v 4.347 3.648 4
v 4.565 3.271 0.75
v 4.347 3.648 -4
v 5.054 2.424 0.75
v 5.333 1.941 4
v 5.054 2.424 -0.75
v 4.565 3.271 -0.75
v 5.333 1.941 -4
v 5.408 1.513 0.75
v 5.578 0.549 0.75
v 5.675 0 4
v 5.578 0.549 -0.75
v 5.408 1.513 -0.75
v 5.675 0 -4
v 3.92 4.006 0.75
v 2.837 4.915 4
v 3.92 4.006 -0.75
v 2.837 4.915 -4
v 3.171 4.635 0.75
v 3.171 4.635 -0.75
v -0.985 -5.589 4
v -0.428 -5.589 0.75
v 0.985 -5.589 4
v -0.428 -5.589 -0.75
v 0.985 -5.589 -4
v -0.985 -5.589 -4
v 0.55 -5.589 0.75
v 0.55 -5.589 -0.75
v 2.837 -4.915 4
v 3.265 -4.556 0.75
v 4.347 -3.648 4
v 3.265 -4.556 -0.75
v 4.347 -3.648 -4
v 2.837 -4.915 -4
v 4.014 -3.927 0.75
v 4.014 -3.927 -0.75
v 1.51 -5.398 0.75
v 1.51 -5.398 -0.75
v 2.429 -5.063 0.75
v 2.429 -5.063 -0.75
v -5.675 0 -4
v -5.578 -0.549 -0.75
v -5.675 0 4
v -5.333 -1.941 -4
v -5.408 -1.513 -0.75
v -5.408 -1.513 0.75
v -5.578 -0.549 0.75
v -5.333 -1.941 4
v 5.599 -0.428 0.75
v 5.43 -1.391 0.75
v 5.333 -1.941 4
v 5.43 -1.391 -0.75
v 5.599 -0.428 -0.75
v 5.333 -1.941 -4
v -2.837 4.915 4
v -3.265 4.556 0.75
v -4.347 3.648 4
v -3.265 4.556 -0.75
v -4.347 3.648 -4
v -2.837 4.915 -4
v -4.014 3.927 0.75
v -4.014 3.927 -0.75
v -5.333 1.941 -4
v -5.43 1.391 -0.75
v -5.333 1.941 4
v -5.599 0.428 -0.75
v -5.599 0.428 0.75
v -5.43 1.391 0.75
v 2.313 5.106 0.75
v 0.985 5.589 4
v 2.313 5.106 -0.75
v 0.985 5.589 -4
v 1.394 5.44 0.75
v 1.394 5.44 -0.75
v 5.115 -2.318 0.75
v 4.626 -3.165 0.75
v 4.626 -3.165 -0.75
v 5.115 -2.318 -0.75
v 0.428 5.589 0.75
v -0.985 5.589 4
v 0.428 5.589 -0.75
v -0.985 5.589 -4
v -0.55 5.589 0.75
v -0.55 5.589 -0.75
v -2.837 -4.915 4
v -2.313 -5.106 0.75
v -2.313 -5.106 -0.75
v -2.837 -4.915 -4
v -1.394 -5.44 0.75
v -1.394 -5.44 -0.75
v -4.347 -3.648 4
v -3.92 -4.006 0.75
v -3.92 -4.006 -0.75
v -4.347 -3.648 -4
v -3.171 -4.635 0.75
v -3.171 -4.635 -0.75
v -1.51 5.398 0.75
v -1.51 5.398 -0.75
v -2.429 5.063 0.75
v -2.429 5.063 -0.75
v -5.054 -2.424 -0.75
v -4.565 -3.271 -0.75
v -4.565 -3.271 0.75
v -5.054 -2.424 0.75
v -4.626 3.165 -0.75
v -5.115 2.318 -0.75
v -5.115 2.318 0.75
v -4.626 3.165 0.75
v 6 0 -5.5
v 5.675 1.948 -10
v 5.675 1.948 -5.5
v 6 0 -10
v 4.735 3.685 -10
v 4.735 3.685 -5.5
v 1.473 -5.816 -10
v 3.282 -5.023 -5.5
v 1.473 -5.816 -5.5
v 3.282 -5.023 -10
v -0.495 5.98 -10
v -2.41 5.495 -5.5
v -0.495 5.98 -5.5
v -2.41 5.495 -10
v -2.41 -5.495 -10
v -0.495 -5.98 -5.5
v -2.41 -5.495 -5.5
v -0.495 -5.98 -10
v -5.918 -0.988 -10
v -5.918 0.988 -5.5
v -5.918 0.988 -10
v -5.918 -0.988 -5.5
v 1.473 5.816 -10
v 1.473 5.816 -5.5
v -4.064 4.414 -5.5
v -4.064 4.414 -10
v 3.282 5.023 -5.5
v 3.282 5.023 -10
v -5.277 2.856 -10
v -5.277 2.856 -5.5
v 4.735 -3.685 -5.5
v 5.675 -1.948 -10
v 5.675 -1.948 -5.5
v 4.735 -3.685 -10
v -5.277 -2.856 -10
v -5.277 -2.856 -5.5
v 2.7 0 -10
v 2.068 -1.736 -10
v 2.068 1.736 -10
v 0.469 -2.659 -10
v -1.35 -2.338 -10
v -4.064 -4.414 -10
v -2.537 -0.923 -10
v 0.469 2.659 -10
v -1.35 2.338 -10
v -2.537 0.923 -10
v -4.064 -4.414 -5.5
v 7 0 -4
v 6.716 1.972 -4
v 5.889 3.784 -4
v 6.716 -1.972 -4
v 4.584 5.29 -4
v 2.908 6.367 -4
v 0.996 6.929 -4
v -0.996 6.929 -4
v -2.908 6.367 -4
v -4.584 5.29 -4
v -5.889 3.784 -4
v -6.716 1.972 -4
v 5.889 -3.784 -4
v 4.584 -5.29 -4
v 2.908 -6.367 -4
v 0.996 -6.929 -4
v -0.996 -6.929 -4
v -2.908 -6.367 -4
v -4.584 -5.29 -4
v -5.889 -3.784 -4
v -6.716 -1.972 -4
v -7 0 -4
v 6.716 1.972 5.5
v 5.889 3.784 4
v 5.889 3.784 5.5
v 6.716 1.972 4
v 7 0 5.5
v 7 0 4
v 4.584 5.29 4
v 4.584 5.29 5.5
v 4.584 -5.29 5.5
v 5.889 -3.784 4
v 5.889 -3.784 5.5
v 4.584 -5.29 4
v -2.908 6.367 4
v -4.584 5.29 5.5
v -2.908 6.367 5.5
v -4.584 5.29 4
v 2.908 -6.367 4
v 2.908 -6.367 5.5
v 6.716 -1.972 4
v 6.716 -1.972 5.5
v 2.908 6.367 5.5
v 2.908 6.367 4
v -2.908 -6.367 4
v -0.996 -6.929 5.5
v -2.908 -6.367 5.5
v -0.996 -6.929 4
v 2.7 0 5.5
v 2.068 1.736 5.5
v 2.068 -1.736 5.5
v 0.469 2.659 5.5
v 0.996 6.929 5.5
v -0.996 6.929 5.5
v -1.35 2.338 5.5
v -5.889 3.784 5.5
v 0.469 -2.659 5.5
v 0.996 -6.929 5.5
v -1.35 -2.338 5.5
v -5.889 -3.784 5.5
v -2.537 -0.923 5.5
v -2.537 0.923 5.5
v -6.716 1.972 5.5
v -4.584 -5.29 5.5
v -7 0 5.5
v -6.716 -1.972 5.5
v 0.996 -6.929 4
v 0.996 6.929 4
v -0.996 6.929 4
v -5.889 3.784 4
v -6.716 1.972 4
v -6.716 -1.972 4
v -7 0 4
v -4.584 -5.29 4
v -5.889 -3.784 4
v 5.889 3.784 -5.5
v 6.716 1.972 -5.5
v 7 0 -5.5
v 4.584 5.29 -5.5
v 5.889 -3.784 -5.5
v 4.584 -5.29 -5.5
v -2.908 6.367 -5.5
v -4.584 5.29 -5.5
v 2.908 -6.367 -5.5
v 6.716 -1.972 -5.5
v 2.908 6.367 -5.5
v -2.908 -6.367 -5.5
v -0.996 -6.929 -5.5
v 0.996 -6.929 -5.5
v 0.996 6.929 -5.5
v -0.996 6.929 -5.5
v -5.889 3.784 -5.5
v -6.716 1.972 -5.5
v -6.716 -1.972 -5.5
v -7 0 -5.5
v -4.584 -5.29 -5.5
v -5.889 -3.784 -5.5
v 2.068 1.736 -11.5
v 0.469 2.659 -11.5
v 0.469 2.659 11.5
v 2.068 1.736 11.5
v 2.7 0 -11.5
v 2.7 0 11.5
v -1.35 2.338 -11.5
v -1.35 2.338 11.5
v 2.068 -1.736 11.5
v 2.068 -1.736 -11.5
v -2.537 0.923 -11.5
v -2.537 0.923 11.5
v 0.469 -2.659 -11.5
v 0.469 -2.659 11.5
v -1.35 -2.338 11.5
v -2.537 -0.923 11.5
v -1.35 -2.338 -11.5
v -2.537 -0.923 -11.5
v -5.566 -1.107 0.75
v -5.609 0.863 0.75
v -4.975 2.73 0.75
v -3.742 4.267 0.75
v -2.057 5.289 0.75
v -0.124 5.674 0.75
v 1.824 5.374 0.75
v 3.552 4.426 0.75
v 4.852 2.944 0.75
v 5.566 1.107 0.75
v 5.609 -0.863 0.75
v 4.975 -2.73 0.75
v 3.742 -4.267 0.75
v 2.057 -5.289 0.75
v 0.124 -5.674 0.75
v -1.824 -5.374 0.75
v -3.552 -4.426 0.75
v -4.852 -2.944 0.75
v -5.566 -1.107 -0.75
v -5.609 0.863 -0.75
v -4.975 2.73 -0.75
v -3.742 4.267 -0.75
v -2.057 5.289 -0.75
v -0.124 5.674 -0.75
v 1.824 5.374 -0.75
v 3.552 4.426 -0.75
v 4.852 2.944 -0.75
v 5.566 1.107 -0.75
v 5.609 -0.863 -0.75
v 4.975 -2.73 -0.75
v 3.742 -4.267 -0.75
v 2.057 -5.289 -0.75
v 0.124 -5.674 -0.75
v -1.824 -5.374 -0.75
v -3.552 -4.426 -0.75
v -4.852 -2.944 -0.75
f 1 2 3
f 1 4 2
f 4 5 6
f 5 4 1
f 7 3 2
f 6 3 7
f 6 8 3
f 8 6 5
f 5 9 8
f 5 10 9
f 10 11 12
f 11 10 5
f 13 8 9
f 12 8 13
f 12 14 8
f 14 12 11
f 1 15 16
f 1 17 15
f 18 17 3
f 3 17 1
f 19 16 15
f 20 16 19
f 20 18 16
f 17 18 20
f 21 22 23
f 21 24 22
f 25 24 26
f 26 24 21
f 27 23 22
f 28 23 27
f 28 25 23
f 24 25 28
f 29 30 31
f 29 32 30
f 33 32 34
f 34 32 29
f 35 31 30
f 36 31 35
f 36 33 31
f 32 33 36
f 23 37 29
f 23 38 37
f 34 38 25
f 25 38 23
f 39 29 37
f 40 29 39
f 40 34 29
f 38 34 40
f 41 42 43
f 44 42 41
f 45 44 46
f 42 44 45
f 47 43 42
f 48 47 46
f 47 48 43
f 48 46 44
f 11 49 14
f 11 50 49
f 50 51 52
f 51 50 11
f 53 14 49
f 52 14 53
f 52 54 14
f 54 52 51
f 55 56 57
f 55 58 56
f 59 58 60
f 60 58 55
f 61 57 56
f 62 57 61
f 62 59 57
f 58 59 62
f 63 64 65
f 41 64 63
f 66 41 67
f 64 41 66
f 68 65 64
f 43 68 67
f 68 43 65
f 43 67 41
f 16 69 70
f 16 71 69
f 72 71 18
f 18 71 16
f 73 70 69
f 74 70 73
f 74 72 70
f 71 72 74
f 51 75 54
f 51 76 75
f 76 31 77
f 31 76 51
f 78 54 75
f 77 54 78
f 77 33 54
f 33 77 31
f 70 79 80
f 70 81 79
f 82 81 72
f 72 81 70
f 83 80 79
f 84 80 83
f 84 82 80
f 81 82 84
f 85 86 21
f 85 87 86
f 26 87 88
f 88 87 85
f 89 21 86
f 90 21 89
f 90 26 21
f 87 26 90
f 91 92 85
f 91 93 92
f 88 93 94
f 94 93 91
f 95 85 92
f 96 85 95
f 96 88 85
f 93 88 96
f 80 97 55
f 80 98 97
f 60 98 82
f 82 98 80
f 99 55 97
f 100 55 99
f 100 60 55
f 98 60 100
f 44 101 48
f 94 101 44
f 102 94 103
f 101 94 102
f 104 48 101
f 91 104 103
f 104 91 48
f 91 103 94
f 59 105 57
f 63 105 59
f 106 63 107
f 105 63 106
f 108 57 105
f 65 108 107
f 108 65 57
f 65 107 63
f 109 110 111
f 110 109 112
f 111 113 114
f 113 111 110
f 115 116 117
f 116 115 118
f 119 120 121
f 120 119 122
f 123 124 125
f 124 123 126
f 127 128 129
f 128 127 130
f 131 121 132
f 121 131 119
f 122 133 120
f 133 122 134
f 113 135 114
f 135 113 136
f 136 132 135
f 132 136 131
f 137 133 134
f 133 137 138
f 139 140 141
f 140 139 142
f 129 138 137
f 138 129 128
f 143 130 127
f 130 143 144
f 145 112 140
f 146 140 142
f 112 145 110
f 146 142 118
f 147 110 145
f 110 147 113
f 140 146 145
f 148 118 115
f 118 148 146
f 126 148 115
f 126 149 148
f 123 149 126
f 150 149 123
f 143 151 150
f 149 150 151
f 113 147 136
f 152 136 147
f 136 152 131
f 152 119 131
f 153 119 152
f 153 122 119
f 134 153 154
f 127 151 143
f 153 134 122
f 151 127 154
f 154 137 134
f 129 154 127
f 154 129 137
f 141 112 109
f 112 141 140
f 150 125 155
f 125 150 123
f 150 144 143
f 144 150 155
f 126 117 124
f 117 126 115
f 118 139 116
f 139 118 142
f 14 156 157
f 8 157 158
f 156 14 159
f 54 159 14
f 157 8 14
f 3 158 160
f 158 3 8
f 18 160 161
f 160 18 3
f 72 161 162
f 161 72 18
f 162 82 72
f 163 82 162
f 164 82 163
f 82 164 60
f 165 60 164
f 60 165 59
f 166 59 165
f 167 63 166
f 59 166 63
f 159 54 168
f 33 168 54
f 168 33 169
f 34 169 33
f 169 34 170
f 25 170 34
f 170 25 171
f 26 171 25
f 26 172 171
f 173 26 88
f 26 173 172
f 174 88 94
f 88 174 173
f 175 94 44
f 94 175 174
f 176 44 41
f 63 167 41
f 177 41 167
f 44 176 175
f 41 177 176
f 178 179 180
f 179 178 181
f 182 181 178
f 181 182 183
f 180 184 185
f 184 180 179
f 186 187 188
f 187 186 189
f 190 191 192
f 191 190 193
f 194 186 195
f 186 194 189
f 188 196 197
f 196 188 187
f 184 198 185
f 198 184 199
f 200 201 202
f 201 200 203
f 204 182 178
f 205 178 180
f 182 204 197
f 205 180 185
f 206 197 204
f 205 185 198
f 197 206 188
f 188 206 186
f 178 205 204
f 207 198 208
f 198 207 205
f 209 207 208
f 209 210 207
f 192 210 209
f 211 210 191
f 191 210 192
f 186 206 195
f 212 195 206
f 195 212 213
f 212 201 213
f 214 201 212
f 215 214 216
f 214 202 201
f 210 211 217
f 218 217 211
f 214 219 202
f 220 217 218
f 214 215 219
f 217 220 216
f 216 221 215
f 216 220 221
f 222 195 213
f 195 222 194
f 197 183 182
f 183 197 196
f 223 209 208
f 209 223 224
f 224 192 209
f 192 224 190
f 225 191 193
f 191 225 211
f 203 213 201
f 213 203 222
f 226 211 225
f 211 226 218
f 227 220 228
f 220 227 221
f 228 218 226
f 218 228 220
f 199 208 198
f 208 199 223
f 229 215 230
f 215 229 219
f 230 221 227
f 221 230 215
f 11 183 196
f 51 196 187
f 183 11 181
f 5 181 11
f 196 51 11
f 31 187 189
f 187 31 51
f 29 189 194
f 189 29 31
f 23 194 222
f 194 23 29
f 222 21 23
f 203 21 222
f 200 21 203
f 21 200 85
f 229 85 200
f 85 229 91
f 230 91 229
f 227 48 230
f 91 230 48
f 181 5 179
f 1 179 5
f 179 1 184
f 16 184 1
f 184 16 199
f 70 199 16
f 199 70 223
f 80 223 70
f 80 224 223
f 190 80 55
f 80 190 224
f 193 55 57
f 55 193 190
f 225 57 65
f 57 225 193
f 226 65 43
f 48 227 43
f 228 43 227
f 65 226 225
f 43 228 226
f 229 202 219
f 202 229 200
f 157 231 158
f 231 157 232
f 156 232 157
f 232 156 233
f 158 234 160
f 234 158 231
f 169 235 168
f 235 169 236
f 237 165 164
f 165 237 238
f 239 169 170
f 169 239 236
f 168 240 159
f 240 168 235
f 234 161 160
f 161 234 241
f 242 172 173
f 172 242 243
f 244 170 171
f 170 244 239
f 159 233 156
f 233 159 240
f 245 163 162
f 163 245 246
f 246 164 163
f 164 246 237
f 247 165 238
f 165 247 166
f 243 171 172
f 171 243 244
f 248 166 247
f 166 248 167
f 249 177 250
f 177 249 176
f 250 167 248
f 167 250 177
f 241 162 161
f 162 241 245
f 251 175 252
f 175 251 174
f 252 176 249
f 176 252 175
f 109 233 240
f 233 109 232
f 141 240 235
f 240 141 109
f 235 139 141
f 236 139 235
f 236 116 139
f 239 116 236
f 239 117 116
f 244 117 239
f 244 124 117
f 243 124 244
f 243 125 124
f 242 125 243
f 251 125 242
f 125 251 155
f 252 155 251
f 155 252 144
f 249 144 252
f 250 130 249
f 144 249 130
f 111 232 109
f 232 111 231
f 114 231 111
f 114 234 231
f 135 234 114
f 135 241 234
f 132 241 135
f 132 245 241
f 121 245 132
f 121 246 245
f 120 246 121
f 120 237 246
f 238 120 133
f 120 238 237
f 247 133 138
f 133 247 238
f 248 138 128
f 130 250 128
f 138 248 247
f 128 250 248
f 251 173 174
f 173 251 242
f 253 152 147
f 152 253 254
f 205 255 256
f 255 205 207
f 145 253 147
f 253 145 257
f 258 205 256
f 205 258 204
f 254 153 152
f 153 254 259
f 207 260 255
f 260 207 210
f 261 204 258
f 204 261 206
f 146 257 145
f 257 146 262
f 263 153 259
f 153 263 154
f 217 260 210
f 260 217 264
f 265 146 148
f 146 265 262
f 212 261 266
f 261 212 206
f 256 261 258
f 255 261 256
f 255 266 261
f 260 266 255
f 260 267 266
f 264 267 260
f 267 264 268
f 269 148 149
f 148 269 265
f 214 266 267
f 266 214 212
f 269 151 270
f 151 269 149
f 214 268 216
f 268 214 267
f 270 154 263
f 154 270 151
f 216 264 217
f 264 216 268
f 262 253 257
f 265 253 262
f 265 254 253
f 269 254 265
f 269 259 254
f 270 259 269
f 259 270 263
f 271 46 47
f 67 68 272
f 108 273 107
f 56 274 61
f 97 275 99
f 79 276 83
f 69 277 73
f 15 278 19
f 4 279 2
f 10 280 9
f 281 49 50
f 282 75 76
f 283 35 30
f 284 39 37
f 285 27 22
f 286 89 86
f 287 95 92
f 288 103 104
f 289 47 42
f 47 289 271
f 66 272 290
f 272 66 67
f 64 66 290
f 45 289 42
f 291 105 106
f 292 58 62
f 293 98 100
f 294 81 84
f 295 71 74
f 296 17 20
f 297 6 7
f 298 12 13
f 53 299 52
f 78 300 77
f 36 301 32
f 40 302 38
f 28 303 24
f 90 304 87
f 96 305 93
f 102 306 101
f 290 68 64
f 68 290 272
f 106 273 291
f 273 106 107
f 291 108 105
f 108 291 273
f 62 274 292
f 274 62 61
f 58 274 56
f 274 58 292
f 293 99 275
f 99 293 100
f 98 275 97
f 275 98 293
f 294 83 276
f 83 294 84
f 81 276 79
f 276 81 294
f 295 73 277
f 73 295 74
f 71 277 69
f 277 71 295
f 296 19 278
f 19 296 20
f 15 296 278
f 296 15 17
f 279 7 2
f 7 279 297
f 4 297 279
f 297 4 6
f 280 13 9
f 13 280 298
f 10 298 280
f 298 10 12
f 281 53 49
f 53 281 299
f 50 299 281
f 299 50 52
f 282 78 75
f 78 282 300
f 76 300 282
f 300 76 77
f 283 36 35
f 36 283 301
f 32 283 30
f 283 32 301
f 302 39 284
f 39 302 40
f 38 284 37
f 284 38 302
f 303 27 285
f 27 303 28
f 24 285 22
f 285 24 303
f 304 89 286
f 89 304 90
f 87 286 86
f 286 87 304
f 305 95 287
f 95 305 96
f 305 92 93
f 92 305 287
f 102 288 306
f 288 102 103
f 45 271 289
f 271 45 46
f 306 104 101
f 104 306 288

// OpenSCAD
// Parameters
tooth_count = 16; //[8:64:1]
pitch_diameter_mm = 9.75; //[5:20:0.01]
pitch_radius_mm = 4.875; //[2.5:10:0.001]
belt_pitch_mm = 2; //[1:10:0.01]
tooth_depth_mm = 0.8; //[0.4:2:0.01]
tooth_width_mm = 1.5; //[0.8:4:0.01]
pulley_width_mm = 10; //[5:30:0.1]
bore_diameter_mm = 5; //[2:12:0.01]
hub_diameter_mm = 12; //[6:30:0.1]
hub_length_mm = 6; //[0:20:0.1]
flange_diameter_mm = 14; //[8:40:0.1]
flange_thickness_mm = 1.5; //[0:5:0.1]
set_screw_count = 1; //[0:4:1]
set_screw_hole_diameter_mm = 3; //[1.5:6:0.01]
set_screw_z_offset_mm = 3; //[0:20:0.1]
tolerance_mm = 0.2; //[0:0.6:0.01]
overlap_mm = 1; //[0.5:2:0.1]
pitch_ref_radial_thickness_mm = 0.4; //[0.2:1.5:0.05]
pitch_ref_z_thickness_mm = 0.6; //[0.2:2:0.05]

// Printed Pulley Teeth From Profile
module printed_pulley_teeth_from_profile() {
  rotate_extrude() {
    polygon(points=[
      [pitch_radius_mm - tooth_depth_mm, -tooth_width_mm/2],
      [pitch_radius_mm + tooth_depth_mm, -tooth_width_mm/2],
      [pitch_radius_mm + tooth_depth_mm, tooth_width_mm/2],
      [pitch_radius_mm - tooth_depth_mm, tooth_width_mm/2]
    ]);
  }
}

// Printed Pulley GT2 Teeth
module printed_pulley_GT2_teeth() {
  rotate([0, 0, 180/tooth_count])
    printed_pulley_teeth_from_profile();
}

// Printed Pulley Teeth
module printed_pulley_teeth() {
  printed_pulley_GT2_teeth();
}

// Pulley
module pulley() {
  color("Silver") {
    // Pulley body with hub and flanges
    union() {
      // Pulley body
      cylinder(r=pitch_radius_mm + tooth_depth_mm, h=pulley_width_mm, center=true);
      // Hub
      translate([0, 0, -(pulley_width_mm/2 + hub_length_mm/2 - overlap_mm)])
        cylinder(r=hub_diameter_mm/2, h=hub_length_mm, center=true);
      // Flanges
      translate([0, 0, pulley_width_mm/2 + flange_thickness_mm/2 - overlap_mm])
        cylinder(r=flange_diameter_mm/2, h=flange_thickness_mm, center=true);
      translate([0, 0, -(pulley_width_mm/2 + flange_thickness_mm/2 - overlap_mm)])
        cylinder(r=flange_diameter_mm/2, h=flange_thickness_mm, center=true);
    }
    // Pitch circle reference
    translate([0, 0, pulley_width_mm/2 - pitch_ref_z_thickness_mm/2 - overlap_mm])
      difference() {
        cylinder(r=pitch_radius_mm + pitch_ref_radial_thickness_mm/2, h=pitch_ref_z_thickness_mm, center=true);
        cylinder(r=pitch_radius_mm - pitch_ref_radial_thickness_mm/2, h=pitch_ref_z_thickness_mm + 2*overlap_mm, center=true);
      }
    // Center bore
    difference() {
      cylinder(r=bore_diameter_mm/2 + tolerance_mm, h=pulley_width_mm + 2*flange_thickness_mm + hub_length_mm + 4*overlap_mm, center=true);
      // Set screw holes
      if (set_screw_count > 0) {
        for (i = [0 : 360/set_screw_count : 360-360/set_screw_count]) {
          rotate([0, 0, i])
            translate([hub_diameter_mm/2 - (set_screw_hole_diameter_mm/2 + tolerance_mm) - overlap_mm, 0, -(pulley_width_mm/2 + hub_length_mm) + set_screw_z_offset_mm])
              rotate([0, 90, 0])
                cylinder(r=set_screw_hole_diameter_mm/2 + tolerance_mm, h=hub_diameter_mm + 4*overlap_mm, center=true);
        }
      }
    }
  }
}

// Assembly
module assembly() {
  pulley();
  printed_pulley_teeth();
}

assembly();
